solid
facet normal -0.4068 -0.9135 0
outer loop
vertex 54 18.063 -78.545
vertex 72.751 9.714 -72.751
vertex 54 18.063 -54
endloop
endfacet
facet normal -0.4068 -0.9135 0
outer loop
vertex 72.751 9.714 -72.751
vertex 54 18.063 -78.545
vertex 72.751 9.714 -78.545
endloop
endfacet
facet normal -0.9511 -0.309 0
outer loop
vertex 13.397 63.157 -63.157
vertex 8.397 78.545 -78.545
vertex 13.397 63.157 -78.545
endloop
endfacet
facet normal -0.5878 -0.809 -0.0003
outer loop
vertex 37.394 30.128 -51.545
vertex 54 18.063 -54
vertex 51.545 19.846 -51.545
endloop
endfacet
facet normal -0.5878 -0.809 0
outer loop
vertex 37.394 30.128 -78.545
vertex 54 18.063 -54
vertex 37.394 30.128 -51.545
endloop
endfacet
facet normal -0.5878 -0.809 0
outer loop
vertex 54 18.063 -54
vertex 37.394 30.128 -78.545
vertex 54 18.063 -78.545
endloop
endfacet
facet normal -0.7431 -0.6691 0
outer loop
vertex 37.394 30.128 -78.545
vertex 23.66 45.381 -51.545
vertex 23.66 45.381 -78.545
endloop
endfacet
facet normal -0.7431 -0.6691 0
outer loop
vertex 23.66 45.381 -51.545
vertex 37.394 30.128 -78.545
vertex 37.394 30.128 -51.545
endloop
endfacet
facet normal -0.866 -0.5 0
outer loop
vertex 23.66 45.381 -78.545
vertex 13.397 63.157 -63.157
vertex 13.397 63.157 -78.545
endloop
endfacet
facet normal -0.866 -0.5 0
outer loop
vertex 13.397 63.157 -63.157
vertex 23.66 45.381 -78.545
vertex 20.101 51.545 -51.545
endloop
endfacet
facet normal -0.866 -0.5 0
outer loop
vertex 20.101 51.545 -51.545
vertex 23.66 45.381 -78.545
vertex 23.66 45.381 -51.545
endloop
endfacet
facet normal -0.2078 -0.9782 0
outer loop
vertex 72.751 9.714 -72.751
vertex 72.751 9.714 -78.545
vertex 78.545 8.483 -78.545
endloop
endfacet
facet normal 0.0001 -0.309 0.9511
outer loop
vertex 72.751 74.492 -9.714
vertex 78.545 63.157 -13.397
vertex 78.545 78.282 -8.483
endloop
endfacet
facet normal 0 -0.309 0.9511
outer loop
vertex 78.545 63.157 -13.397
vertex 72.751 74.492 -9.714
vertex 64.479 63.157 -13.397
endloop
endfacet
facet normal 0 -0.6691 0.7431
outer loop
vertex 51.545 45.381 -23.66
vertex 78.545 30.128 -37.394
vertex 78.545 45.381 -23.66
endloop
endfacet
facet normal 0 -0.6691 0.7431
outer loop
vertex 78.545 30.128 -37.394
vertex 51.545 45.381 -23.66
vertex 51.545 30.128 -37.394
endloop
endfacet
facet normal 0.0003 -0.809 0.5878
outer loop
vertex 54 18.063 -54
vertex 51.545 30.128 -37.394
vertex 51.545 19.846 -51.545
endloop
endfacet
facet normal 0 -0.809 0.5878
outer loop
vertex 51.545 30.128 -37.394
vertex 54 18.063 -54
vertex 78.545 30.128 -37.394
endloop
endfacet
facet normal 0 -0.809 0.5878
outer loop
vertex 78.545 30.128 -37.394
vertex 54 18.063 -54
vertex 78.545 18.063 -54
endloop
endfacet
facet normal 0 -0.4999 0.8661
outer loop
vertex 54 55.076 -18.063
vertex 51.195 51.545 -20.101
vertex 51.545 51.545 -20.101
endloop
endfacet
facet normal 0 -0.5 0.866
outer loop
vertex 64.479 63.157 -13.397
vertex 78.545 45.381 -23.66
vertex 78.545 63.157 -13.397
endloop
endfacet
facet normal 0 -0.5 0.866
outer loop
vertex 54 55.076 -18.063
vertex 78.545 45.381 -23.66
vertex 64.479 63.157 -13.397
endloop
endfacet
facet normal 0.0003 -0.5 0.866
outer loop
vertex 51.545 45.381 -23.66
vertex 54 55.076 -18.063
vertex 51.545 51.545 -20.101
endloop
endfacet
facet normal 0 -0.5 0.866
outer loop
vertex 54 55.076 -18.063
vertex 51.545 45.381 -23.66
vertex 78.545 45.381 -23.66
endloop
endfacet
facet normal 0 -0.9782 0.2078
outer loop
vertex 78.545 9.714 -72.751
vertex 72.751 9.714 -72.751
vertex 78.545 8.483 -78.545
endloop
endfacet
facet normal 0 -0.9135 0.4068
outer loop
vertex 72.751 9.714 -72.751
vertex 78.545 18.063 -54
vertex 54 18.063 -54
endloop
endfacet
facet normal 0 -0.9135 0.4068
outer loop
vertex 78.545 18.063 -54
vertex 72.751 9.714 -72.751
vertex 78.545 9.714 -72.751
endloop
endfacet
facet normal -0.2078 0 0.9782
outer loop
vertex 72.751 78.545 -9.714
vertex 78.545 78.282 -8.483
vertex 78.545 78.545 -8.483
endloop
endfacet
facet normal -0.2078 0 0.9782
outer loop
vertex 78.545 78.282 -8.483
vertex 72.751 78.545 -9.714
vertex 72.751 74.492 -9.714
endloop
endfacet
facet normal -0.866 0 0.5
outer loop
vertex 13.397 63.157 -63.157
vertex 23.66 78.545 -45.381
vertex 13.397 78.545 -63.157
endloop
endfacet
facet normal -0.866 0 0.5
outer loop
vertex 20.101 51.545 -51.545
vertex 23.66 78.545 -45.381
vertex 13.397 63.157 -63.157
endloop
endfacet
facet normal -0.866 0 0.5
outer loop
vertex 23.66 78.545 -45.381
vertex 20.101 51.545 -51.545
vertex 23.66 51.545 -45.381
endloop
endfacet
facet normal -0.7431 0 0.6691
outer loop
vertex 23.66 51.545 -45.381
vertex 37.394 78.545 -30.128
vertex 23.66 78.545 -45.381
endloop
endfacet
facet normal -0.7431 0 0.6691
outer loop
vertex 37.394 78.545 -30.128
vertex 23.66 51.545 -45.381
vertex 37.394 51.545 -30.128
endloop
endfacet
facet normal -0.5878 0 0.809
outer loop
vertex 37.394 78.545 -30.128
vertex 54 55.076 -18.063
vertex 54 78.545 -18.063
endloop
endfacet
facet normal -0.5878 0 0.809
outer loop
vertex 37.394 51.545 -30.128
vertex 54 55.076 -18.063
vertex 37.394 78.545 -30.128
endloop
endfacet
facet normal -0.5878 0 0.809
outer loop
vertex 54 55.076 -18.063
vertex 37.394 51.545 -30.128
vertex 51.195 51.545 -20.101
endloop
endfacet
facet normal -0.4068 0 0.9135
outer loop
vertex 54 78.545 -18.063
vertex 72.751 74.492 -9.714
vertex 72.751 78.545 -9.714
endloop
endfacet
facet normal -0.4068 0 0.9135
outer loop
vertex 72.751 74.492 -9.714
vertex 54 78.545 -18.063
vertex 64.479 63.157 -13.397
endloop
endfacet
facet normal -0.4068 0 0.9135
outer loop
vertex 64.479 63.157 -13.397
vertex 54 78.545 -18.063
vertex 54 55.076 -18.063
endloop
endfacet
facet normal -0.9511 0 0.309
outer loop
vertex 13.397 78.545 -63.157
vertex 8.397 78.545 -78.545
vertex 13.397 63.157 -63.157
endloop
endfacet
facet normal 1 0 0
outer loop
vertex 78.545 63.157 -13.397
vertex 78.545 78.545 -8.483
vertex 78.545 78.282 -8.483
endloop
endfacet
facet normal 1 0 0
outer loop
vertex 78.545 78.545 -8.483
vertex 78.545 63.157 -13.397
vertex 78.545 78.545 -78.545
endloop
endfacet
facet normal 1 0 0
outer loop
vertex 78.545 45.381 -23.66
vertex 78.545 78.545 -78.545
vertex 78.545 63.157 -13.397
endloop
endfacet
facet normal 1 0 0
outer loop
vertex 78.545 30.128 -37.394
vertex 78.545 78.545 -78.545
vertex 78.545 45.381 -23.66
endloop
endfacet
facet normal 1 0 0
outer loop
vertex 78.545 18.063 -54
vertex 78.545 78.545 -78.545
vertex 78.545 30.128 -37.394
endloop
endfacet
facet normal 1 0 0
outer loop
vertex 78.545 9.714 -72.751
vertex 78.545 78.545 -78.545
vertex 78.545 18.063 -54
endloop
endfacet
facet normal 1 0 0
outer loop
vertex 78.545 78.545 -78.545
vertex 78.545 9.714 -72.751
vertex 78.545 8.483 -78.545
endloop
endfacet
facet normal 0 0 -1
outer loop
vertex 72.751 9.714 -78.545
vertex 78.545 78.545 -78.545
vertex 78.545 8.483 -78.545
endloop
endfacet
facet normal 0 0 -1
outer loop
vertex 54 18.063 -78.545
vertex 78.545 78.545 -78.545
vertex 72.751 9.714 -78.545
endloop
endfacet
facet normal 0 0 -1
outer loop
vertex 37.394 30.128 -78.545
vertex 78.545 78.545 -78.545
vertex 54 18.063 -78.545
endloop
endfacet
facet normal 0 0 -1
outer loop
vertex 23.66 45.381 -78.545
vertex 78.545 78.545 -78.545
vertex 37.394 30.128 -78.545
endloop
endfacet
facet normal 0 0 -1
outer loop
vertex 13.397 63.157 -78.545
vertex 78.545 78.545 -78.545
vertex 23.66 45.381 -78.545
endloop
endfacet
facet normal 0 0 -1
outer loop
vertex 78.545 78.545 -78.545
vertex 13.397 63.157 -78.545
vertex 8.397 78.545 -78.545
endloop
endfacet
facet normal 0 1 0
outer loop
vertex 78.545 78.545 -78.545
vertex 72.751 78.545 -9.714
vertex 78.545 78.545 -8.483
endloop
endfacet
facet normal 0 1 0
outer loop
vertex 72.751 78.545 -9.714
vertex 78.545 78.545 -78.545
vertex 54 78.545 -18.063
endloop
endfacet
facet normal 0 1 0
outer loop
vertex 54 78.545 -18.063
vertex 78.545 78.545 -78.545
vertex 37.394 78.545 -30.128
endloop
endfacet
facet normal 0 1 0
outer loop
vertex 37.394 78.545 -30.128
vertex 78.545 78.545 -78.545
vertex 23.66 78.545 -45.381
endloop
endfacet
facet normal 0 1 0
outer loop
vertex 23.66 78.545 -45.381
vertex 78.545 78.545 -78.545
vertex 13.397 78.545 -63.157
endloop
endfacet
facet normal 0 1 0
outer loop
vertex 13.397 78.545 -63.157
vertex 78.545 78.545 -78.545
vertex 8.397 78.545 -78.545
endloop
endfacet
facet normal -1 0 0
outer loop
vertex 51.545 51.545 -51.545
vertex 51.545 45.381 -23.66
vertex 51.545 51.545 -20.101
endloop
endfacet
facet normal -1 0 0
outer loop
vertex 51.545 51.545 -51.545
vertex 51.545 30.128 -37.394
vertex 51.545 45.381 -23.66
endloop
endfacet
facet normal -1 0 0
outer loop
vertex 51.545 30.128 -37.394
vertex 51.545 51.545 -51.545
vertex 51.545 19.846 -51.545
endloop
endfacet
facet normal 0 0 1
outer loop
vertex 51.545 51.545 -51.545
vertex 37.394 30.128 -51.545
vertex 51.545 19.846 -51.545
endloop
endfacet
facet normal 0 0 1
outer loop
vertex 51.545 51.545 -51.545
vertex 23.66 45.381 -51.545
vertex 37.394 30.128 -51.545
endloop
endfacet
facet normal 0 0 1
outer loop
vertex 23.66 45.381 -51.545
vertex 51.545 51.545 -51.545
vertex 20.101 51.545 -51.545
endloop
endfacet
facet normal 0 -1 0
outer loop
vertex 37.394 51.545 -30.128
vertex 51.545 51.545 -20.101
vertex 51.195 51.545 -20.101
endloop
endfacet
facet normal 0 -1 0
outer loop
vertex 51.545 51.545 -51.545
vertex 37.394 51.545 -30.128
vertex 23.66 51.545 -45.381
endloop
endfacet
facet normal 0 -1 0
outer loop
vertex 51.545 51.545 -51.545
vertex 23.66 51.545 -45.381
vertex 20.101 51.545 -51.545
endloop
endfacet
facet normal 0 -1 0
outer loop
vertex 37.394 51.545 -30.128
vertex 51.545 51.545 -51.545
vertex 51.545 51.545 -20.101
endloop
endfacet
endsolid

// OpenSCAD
// file: corner_cube.scad
include <variables.scad>

module corner_cube() {
    difference() {    
        difference() {
            difference() {
                cubie();
                translate([0,-CUBIE/2+tile_height,0])
                rotate(v=[1,0,0],a=90)
                tile(tile_length*1.05,tile_height*100);
            }
            translate([-CUBIE/2+tile_height,0,0])
            rotate(v=[0,1,0],a=90)
            tile(tile_length*1.05,tile_height*100);
        }
        translate([0,0,CUBIE/2-tile_height])
        tile(tile_length*1.05,tile_height*100);
    }
}

corner_cube();
// file: variables.scad
//$fn=50;

scale_factor = 300/55;

CUBIE=18.9*scale_factor; //total side length of each cube piece (including rounded edges)
CORE=18*scale_factor;
SCREW_TIP=1.5*scale_factor;
SCREW_BODY=2*scale_factor;
SCREW_HEAD=3.8*scale_factor;
INNER=4.5*scale_factor;
SPRING=3.2*scale_factor;
ROUND=2*scale_factor; //radius of rounded edges
DEPTH=6*scale_factor;
RAFT=5*scale_factor;
LAYER=0.3*scale_factor;
GAP=0.25*scale_factor;

core_height = 20 * scale_factor;
core_radius = 3.1 * scale_factor;

WITH_SUPPORT=false;
WITH_RAFT=false;

inner_cubie=(CUBIE-2*ROUND); //length of each cube before rounded edges

tile_length = inner_cubie*0.75;
//tile_height = 0.8 * scale_factor;
tile_height = 3;



module tile(length, height) {
	translate([-length/2,-length/2,0]) {
		minkowski(){
			translate([0,0,-height/2]) cube([length,length,height]);
			cylinder(r=ROUND,h=height,center=true);
		}
	}
	
}
//tile(tile_length,tile_height);

module cubie() {
    translate([-inner_cubie/2,-inner_cubie/2, -inner_cubie/2])
    minkowski() {
        cube([inner_cubie, inner_cubie, inner_cubie]);
        sphere(r=ROUND);
    }
}

module disc() {
    cylinder(CUBIE, r1=CORE, r2=CORE,  center=true);

}

module disc2() {
    cylinder(CUBIE*10, r1=CORE, r2=CORE,center=true);

}

module icore() {
    disc();
    rotate([0,90,0])
        disc();
    rotate([90,0,0])
        disc();
}

module core2() {
    intersection() {
        disc2();
        rotate([0,90,0])
            disc2();
        rotate([90,0,0])
            disc2();
    }
}

module screw() {
    translate([5.2,0,0])
    rotate([0,90,0]) {
        cylinder(11.7,r1=SCREW_BODY,r2=SCREW_BODY,center=true);
        translate([0,0,-11.7/2-1.7/2])
            cylinder(1.7,r1=SCREW_HEAD,r2=SCREW_HEAD,center=true);
        translate([0,0,11.7/2+5.7/2])
            cylinder(5.7,r1=SCREW_TIP,r2=SCREW_TIP,center=true);
    }
}
// main file
include <variables.scad>
use <corner_cube.scad>

module corner_piece_connector_solid() {
    difference() {
        intersection() {
        cube(size=CUBIE+CUBIE-2*INNER,center=true);
        translate([CUBIE,CUBIE,-CUBIE])
        core2();
        }
    }
}
module corner_connector() {
    difference() {
        corner_piece_connector_solid();
        cube(size=CUBIE, center=true);
    }
}

corner_connector();
